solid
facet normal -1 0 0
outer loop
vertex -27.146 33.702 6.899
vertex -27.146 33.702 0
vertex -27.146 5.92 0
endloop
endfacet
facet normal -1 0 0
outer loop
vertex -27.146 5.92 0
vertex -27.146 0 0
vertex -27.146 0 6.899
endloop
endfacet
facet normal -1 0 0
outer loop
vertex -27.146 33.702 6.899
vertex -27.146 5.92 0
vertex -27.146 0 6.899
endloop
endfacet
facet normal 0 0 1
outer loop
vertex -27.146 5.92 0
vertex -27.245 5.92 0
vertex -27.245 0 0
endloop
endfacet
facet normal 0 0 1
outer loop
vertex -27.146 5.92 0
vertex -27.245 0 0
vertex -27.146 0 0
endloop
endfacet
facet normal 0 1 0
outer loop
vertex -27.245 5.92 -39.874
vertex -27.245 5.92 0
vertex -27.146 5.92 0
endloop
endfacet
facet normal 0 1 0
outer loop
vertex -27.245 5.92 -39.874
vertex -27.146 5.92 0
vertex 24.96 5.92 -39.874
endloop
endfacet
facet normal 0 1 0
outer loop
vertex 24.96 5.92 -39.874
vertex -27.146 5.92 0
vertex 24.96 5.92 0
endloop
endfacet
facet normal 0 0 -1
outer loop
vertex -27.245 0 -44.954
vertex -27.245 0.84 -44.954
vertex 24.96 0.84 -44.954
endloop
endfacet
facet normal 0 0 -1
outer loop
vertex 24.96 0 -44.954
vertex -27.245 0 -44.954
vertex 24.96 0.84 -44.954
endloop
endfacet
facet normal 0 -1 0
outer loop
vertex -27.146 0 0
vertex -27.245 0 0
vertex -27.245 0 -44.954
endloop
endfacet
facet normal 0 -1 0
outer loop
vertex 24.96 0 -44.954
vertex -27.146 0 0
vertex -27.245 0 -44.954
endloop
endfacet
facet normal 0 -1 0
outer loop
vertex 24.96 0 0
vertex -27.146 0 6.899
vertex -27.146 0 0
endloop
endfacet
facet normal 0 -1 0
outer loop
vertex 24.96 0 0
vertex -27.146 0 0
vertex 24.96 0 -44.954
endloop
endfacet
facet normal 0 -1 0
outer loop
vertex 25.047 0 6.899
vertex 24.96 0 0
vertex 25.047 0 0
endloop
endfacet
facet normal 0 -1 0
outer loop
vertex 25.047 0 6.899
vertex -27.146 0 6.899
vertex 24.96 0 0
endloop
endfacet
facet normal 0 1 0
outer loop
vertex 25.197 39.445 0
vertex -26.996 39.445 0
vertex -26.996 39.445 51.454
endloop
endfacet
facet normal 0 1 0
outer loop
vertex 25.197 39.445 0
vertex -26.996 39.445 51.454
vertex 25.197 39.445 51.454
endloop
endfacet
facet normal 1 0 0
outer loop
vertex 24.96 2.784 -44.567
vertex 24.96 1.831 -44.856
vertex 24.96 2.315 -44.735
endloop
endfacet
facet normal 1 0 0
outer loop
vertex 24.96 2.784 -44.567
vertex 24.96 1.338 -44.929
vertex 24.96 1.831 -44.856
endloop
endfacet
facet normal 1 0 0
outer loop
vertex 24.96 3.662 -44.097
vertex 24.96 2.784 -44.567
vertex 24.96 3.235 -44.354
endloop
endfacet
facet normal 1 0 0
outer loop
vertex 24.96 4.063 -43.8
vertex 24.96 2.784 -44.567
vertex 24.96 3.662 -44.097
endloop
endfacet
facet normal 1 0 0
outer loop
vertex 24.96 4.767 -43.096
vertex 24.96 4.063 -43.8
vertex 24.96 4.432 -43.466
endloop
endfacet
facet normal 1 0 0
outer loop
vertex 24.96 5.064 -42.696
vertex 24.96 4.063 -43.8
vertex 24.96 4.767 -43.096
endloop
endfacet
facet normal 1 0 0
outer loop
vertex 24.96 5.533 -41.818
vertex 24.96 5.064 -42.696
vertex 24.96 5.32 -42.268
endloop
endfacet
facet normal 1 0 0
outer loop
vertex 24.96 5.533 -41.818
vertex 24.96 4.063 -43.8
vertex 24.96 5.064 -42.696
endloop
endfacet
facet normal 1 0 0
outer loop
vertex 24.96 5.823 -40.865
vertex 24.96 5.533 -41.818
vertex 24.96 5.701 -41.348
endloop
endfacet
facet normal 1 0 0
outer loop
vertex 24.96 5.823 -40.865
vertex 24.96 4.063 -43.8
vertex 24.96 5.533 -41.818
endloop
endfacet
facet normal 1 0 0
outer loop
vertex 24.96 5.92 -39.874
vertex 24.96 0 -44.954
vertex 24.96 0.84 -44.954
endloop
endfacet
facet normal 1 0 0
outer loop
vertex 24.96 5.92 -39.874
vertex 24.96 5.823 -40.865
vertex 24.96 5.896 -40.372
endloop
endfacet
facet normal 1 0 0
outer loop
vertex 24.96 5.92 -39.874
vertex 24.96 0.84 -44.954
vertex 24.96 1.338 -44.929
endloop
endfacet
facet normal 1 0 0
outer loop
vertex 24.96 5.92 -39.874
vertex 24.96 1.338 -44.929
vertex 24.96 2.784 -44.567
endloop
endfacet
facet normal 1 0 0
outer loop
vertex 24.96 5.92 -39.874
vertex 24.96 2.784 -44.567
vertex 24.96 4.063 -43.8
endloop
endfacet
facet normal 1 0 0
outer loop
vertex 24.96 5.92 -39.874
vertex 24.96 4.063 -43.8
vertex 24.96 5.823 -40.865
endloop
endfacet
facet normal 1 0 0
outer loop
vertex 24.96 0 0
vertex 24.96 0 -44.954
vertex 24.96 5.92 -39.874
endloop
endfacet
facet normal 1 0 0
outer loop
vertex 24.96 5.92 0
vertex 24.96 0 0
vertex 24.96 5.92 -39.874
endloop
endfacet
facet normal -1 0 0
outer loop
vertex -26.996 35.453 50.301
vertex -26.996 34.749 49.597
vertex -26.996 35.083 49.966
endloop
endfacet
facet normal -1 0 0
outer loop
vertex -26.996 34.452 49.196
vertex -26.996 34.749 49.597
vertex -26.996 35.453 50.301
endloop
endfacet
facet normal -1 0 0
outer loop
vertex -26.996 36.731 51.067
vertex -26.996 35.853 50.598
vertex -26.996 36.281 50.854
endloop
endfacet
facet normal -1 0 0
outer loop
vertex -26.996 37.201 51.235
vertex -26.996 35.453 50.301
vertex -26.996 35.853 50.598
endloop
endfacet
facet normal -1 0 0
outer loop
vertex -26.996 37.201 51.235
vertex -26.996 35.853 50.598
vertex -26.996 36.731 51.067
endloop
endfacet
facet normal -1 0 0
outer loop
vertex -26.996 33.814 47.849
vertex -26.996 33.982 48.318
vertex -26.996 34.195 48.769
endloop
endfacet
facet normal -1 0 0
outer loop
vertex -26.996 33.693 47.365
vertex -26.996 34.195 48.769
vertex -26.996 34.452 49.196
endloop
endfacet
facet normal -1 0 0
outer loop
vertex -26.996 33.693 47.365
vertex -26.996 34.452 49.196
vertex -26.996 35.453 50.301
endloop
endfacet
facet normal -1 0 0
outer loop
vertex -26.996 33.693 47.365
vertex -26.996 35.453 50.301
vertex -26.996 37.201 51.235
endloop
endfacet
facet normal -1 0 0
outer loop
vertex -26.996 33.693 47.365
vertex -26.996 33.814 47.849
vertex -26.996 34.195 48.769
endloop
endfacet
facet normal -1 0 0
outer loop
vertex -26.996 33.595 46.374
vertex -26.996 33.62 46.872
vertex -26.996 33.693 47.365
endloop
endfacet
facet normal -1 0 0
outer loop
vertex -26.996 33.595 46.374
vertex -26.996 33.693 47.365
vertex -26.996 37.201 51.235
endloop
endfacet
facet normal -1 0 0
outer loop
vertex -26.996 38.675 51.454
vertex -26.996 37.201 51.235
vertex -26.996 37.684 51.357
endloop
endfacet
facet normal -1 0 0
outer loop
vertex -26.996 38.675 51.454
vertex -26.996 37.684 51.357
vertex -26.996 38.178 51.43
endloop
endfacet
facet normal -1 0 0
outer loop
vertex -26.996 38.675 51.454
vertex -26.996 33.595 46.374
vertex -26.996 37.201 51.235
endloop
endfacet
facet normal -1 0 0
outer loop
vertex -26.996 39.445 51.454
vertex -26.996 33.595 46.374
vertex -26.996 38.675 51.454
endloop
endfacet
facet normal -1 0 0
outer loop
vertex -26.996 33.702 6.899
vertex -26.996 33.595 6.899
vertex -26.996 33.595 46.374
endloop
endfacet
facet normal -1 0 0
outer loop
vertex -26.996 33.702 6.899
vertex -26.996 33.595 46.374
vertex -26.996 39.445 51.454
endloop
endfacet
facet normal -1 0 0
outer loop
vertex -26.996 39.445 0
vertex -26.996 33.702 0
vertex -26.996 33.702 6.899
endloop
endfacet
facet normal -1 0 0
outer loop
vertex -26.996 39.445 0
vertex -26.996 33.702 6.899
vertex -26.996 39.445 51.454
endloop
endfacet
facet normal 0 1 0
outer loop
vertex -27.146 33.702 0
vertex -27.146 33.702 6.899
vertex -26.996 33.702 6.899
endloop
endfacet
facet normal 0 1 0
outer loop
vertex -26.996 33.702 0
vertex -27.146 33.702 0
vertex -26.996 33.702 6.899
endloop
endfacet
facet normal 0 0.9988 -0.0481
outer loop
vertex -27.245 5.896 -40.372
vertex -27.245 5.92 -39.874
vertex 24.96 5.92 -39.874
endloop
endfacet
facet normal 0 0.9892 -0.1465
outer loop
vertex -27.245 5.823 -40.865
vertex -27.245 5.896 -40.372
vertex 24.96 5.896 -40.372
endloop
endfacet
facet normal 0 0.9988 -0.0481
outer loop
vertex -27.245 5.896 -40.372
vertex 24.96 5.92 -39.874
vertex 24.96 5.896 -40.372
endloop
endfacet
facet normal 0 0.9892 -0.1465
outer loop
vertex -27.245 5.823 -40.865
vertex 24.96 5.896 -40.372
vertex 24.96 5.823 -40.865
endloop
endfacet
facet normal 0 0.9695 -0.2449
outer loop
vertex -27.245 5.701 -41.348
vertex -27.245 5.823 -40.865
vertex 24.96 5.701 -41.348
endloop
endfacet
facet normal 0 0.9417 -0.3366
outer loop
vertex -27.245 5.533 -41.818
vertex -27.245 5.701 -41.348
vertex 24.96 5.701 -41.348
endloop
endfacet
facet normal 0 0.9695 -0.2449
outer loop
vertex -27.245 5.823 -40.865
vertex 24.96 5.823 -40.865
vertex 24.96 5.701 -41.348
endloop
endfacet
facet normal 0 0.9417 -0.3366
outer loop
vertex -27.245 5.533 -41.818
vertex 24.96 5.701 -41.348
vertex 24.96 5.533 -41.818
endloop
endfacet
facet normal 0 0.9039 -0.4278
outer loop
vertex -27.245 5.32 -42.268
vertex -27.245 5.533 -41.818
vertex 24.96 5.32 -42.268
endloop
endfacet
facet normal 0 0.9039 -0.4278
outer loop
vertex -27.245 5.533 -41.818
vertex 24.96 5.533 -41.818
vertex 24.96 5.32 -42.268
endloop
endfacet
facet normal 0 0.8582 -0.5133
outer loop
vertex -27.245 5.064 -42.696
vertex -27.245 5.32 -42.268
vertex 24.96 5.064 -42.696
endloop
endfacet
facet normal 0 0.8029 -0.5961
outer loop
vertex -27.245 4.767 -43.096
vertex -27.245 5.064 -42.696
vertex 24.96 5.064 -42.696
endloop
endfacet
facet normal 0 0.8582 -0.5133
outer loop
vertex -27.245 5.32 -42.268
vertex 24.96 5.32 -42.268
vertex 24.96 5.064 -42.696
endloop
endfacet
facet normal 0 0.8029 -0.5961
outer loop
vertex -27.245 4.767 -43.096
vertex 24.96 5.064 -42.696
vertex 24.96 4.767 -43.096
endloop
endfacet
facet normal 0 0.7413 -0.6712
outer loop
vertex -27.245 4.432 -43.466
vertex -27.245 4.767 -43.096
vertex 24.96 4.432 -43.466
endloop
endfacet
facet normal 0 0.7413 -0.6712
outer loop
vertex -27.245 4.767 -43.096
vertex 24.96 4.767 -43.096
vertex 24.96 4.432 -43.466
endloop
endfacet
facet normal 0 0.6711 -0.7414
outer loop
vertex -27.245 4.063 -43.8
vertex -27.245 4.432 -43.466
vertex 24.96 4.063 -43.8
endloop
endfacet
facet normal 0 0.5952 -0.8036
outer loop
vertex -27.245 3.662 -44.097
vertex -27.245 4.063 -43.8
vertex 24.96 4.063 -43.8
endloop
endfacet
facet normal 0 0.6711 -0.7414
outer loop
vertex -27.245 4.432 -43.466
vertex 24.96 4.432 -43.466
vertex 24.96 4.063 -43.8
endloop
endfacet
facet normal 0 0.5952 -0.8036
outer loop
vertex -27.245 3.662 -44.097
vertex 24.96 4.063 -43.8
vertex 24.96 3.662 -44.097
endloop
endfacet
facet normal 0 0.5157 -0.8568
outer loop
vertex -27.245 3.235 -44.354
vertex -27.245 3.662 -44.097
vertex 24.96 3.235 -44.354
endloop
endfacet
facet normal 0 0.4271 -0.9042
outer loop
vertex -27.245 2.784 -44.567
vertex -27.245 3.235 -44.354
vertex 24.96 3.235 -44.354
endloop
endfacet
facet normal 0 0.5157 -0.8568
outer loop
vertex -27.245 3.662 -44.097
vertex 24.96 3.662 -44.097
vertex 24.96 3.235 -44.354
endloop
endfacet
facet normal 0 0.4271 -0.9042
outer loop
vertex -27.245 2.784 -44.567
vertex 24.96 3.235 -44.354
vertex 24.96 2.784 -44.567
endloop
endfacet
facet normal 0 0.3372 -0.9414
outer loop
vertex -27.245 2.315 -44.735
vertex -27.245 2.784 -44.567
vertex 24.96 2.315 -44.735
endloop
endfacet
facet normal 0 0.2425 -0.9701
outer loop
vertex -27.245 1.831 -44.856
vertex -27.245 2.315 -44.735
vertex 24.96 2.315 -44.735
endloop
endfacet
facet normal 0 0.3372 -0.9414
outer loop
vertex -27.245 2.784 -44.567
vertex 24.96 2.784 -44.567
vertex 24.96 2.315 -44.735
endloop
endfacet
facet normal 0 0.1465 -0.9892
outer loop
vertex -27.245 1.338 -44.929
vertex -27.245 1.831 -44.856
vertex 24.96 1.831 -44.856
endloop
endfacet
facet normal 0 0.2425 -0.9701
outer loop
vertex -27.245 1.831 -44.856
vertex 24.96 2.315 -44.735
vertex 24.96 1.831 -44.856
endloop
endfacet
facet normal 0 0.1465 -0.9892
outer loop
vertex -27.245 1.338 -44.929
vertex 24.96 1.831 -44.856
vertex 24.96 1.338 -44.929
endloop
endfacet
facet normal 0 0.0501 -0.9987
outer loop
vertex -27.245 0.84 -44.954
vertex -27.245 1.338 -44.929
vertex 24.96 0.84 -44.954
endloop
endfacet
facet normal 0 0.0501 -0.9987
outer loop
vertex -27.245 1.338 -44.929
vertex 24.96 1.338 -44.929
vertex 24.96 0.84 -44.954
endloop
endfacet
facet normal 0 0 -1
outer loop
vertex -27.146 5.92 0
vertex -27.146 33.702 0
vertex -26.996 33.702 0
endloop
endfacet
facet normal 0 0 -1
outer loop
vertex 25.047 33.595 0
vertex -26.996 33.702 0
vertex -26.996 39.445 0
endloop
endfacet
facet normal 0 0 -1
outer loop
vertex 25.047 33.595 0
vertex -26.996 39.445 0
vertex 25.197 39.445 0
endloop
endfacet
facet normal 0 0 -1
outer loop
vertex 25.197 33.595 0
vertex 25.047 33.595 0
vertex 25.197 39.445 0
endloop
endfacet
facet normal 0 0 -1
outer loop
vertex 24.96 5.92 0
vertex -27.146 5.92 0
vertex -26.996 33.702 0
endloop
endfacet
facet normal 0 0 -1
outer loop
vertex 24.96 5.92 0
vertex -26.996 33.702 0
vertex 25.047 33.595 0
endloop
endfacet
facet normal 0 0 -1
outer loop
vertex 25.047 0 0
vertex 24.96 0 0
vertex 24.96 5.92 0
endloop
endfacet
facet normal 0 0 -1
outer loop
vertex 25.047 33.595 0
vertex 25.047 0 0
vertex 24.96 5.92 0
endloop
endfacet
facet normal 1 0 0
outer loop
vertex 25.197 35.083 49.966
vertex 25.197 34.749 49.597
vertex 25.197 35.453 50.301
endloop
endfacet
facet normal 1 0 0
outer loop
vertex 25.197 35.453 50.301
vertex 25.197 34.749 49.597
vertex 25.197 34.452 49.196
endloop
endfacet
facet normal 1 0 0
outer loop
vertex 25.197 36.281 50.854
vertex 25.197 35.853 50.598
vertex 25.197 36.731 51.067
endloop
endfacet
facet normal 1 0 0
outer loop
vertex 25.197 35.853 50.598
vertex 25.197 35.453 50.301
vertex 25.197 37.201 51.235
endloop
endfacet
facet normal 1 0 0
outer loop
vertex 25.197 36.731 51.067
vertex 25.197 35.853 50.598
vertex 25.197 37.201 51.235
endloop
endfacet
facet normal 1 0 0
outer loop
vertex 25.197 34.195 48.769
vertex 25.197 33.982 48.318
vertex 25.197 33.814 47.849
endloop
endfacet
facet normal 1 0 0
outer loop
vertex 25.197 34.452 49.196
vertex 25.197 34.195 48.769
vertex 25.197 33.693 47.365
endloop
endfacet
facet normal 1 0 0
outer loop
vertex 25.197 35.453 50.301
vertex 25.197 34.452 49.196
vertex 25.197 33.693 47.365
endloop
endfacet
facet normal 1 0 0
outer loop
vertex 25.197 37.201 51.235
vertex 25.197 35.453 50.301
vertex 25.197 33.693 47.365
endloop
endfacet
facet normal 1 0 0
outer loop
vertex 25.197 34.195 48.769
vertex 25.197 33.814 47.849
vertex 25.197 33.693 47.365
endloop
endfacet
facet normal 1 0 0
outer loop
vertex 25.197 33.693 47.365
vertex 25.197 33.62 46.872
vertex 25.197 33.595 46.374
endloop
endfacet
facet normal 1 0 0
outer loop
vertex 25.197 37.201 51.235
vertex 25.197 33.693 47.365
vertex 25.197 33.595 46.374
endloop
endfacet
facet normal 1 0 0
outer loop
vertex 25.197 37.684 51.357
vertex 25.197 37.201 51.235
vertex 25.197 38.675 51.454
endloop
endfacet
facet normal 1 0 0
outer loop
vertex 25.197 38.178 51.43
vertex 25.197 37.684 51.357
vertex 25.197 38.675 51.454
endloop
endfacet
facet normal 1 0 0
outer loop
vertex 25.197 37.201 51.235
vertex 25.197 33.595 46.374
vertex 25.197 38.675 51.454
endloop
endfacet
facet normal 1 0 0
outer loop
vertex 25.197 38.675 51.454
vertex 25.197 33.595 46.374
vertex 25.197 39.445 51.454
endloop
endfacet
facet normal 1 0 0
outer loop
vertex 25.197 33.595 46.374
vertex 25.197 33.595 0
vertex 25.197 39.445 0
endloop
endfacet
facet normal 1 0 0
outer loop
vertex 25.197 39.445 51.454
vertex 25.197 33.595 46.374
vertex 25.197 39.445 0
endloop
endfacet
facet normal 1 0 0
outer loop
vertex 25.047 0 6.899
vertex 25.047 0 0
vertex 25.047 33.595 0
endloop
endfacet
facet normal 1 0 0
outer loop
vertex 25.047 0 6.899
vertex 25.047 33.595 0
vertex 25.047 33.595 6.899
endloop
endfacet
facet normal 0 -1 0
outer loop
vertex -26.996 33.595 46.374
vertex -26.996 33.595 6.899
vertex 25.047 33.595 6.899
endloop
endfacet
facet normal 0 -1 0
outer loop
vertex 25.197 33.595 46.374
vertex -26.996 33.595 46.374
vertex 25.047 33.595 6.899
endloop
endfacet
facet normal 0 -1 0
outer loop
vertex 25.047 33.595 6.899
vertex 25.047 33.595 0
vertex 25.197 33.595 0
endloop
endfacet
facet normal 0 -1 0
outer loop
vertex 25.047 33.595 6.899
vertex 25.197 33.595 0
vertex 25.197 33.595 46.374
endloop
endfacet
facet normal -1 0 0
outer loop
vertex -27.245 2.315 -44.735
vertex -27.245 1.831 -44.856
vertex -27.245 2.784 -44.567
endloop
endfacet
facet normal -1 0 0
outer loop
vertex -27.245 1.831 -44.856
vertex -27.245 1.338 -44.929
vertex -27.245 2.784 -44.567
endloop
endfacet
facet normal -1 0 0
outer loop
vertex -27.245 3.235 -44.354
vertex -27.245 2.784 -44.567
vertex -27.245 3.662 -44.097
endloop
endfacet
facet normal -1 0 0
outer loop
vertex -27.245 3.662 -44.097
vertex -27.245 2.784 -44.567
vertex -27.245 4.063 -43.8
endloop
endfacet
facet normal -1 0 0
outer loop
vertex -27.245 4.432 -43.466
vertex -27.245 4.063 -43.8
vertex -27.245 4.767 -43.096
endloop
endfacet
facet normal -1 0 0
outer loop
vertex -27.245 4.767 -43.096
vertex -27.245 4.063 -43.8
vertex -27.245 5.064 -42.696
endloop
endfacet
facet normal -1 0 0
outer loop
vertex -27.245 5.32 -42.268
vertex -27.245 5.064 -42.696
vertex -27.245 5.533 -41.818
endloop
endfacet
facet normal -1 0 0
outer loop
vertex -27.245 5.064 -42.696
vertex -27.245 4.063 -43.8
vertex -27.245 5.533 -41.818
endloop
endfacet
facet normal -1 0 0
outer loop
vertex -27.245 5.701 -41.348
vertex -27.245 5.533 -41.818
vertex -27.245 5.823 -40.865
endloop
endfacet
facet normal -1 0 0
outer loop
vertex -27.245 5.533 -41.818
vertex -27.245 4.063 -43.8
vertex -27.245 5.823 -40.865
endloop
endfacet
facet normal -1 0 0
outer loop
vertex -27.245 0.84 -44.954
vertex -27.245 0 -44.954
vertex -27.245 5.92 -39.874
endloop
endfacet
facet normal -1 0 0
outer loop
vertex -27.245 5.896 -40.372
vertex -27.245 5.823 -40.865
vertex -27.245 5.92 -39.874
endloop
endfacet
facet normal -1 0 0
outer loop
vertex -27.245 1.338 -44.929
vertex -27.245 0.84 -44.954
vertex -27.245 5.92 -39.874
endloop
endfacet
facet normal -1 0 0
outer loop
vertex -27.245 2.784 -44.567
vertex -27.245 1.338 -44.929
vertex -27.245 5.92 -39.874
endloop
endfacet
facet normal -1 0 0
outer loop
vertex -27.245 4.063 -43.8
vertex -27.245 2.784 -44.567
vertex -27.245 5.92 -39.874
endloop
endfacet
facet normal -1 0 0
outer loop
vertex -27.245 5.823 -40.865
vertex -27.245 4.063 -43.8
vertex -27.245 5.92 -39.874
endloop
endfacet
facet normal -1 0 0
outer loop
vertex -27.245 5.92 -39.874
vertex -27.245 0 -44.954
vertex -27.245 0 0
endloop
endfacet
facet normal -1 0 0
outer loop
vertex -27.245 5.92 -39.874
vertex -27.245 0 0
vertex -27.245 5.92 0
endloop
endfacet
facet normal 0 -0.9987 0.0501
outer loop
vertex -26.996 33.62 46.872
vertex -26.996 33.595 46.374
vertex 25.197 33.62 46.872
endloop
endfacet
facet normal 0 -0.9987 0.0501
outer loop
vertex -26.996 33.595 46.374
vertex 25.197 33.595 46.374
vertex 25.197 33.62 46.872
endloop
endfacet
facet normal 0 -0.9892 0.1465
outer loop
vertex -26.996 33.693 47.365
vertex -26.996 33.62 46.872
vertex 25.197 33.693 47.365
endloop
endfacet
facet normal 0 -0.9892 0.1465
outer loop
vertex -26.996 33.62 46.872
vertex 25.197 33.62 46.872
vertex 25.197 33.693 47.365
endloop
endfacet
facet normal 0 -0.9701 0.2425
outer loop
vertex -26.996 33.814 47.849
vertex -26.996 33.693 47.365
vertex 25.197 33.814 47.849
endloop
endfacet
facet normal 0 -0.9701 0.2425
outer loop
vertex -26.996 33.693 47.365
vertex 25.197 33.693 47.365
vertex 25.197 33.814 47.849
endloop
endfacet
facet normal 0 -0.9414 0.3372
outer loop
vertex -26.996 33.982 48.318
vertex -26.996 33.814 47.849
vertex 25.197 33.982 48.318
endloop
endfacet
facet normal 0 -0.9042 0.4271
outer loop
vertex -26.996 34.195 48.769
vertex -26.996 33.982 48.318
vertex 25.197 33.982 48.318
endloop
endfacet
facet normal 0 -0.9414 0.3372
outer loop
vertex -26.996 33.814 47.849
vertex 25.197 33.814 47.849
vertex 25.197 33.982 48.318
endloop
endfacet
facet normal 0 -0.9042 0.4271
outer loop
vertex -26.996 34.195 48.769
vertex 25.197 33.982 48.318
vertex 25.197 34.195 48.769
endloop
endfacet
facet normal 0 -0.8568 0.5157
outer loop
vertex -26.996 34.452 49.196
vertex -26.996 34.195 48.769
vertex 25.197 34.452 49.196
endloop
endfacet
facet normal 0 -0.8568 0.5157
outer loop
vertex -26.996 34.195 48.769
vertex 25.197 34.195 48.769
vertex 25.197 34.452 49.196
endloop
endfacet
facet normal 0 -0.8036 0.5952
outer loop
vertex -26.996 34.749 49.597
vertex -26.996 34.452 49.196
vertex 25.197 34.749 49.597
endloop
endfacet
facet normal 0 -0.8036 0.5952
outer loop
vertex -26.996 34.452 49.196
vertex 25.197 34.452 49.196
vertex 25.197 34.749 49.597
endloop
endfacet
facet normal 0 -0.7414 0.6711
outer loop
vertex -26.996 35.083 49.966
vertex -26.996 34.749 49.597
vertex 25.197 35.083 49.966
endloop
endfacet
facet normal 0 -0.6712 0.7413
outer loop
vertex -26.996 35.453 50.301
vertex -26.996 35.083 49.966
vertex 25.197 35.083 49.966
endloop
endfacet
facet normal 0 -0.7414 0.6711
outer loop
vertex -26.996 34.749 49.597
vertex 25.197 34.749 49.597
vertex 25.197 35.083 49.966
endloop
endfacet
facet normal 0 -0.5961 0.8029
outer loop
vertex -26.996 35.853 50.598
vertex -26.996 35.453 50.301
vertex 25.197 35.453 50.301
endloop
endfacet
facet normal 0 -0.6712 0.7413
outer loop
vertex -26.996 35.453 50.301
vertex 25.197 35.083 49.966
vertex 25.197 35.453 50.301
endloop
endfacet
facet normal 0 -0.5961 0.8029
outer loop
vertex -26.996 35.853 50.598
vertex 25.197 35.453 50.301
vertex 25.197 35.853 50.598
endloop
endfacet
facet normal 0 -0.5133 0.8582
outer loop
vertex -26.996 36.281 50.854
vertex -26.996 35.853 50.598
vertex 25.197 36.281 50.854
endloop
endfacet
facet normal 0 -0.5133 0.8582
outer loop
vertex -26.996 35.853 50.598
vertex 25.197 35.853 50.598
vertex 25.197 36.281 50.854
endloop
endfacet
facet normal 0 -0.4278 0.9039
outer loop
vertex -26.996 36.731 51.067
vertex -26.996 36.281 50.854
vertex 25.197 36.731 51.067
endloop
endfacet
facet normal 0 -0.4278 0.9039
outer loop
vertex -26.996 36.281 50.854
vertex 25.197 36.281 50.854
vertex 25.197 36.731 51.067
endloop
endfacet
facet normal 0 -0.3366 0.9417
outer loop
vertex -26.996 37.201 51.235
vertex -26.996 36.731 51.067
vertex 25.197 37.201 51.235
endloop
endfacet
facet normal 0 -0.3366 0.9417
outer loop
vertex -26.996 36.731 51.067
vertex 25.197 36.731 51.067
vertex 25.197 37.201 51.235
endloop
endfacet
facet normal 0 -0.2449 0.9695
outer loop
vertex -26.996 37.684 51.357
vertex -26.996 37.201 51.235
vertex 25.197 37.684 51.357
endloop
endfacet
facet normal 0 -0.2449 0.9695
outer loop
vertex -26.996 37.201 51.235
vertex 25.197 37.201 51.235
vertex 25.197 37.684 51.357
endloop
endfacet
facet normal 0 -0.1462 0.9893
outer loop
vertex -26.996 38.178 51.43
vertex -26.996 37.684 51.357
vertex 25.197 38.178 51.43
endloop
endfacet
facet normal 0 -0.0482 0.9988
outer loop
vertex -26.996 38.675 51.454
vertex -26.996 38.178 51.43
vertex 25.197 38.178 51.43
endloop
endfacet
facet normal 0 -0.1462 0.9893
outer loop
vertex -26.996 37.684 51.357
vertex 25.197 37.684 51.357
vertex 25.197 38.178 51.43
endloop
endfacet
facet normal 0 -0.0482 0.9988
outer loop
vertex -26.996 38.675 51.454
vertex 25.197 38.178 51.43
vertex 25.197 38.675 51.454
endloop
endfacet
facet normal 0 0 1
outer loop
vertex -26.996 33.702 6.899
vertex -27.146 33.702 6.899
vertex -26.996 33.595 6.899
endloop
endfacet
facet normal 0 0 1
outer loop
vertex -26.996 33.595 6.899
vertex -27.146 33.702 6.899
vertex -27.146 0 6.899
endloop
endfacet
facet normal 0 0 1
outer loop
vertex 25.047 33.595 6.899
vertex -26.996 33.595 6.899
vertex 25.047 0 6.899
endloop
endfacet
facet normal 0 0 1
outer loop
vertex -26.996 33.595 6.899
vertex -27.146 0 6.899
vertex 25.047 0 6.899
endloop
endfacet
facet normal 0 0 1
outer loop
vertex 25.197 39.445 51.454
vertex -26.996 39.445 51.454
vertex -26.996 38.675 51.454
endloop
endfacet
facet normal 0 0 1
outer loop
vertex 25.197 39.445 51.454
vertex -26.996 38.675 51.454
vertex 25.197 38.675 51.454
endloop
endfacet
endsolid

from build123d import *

# Parameters (mm, degrees)
F0_W     = 52.1929860115
F0_H     = 5.8492124081
F1_DEPTH = 51.4541193843
F2_W     = 52.1929860115
F2_H     = 6.8990886211
F3_DEPTH = 33.7024219334
F4_W     = 52.2046461701
F4_H     = 5.920117721
F5_DEPTH = 44.953584671
F6_R     = 5.08
F7_R     = 5.08


with BuildPart() as f1:
    # F0 (on Top) → F1 (new body)
    with BuildSketch(Plane.XY):
        with Locations((-0.8998662233, 36.52010113)):
            Rectangle(F0_W, F0_H)
    extrude(amount=F1_DEPTH)

    # F2 (on Front) → F3 (join)
    with BuildSketch(Plane.XZ):
        with Locations((-1.0498464108, 3.4495443106)):
            Rectangle(F2_W, F2_H)
    extrude(amount=-F3_DEPTH)

    # F4 (on Top) → F5 (join)
    with BuildSketch(Plane.XY):
        with Locations((-1.1427812278, 2.9600588605)):
            Rectangle(F4_W, F4_H)
    extrude(amount=-F5_DEPTH)

    # F6
    f6_edges = [f1.edges().sort_by_distance(p)[0] for p in [
        (-1.142781, 5.920118, -44.953585),
    ]]
    fillet(f6_edges, radius=F6_R)

    # F7
    f7_edges = [f1.edges().sort_by_distance(p)[0] for p in [
        (-0.899866, 33.595495, 51.454119),
    ]]
    fillet(f7_edges, radius=F7_R)


solid = f1.part
